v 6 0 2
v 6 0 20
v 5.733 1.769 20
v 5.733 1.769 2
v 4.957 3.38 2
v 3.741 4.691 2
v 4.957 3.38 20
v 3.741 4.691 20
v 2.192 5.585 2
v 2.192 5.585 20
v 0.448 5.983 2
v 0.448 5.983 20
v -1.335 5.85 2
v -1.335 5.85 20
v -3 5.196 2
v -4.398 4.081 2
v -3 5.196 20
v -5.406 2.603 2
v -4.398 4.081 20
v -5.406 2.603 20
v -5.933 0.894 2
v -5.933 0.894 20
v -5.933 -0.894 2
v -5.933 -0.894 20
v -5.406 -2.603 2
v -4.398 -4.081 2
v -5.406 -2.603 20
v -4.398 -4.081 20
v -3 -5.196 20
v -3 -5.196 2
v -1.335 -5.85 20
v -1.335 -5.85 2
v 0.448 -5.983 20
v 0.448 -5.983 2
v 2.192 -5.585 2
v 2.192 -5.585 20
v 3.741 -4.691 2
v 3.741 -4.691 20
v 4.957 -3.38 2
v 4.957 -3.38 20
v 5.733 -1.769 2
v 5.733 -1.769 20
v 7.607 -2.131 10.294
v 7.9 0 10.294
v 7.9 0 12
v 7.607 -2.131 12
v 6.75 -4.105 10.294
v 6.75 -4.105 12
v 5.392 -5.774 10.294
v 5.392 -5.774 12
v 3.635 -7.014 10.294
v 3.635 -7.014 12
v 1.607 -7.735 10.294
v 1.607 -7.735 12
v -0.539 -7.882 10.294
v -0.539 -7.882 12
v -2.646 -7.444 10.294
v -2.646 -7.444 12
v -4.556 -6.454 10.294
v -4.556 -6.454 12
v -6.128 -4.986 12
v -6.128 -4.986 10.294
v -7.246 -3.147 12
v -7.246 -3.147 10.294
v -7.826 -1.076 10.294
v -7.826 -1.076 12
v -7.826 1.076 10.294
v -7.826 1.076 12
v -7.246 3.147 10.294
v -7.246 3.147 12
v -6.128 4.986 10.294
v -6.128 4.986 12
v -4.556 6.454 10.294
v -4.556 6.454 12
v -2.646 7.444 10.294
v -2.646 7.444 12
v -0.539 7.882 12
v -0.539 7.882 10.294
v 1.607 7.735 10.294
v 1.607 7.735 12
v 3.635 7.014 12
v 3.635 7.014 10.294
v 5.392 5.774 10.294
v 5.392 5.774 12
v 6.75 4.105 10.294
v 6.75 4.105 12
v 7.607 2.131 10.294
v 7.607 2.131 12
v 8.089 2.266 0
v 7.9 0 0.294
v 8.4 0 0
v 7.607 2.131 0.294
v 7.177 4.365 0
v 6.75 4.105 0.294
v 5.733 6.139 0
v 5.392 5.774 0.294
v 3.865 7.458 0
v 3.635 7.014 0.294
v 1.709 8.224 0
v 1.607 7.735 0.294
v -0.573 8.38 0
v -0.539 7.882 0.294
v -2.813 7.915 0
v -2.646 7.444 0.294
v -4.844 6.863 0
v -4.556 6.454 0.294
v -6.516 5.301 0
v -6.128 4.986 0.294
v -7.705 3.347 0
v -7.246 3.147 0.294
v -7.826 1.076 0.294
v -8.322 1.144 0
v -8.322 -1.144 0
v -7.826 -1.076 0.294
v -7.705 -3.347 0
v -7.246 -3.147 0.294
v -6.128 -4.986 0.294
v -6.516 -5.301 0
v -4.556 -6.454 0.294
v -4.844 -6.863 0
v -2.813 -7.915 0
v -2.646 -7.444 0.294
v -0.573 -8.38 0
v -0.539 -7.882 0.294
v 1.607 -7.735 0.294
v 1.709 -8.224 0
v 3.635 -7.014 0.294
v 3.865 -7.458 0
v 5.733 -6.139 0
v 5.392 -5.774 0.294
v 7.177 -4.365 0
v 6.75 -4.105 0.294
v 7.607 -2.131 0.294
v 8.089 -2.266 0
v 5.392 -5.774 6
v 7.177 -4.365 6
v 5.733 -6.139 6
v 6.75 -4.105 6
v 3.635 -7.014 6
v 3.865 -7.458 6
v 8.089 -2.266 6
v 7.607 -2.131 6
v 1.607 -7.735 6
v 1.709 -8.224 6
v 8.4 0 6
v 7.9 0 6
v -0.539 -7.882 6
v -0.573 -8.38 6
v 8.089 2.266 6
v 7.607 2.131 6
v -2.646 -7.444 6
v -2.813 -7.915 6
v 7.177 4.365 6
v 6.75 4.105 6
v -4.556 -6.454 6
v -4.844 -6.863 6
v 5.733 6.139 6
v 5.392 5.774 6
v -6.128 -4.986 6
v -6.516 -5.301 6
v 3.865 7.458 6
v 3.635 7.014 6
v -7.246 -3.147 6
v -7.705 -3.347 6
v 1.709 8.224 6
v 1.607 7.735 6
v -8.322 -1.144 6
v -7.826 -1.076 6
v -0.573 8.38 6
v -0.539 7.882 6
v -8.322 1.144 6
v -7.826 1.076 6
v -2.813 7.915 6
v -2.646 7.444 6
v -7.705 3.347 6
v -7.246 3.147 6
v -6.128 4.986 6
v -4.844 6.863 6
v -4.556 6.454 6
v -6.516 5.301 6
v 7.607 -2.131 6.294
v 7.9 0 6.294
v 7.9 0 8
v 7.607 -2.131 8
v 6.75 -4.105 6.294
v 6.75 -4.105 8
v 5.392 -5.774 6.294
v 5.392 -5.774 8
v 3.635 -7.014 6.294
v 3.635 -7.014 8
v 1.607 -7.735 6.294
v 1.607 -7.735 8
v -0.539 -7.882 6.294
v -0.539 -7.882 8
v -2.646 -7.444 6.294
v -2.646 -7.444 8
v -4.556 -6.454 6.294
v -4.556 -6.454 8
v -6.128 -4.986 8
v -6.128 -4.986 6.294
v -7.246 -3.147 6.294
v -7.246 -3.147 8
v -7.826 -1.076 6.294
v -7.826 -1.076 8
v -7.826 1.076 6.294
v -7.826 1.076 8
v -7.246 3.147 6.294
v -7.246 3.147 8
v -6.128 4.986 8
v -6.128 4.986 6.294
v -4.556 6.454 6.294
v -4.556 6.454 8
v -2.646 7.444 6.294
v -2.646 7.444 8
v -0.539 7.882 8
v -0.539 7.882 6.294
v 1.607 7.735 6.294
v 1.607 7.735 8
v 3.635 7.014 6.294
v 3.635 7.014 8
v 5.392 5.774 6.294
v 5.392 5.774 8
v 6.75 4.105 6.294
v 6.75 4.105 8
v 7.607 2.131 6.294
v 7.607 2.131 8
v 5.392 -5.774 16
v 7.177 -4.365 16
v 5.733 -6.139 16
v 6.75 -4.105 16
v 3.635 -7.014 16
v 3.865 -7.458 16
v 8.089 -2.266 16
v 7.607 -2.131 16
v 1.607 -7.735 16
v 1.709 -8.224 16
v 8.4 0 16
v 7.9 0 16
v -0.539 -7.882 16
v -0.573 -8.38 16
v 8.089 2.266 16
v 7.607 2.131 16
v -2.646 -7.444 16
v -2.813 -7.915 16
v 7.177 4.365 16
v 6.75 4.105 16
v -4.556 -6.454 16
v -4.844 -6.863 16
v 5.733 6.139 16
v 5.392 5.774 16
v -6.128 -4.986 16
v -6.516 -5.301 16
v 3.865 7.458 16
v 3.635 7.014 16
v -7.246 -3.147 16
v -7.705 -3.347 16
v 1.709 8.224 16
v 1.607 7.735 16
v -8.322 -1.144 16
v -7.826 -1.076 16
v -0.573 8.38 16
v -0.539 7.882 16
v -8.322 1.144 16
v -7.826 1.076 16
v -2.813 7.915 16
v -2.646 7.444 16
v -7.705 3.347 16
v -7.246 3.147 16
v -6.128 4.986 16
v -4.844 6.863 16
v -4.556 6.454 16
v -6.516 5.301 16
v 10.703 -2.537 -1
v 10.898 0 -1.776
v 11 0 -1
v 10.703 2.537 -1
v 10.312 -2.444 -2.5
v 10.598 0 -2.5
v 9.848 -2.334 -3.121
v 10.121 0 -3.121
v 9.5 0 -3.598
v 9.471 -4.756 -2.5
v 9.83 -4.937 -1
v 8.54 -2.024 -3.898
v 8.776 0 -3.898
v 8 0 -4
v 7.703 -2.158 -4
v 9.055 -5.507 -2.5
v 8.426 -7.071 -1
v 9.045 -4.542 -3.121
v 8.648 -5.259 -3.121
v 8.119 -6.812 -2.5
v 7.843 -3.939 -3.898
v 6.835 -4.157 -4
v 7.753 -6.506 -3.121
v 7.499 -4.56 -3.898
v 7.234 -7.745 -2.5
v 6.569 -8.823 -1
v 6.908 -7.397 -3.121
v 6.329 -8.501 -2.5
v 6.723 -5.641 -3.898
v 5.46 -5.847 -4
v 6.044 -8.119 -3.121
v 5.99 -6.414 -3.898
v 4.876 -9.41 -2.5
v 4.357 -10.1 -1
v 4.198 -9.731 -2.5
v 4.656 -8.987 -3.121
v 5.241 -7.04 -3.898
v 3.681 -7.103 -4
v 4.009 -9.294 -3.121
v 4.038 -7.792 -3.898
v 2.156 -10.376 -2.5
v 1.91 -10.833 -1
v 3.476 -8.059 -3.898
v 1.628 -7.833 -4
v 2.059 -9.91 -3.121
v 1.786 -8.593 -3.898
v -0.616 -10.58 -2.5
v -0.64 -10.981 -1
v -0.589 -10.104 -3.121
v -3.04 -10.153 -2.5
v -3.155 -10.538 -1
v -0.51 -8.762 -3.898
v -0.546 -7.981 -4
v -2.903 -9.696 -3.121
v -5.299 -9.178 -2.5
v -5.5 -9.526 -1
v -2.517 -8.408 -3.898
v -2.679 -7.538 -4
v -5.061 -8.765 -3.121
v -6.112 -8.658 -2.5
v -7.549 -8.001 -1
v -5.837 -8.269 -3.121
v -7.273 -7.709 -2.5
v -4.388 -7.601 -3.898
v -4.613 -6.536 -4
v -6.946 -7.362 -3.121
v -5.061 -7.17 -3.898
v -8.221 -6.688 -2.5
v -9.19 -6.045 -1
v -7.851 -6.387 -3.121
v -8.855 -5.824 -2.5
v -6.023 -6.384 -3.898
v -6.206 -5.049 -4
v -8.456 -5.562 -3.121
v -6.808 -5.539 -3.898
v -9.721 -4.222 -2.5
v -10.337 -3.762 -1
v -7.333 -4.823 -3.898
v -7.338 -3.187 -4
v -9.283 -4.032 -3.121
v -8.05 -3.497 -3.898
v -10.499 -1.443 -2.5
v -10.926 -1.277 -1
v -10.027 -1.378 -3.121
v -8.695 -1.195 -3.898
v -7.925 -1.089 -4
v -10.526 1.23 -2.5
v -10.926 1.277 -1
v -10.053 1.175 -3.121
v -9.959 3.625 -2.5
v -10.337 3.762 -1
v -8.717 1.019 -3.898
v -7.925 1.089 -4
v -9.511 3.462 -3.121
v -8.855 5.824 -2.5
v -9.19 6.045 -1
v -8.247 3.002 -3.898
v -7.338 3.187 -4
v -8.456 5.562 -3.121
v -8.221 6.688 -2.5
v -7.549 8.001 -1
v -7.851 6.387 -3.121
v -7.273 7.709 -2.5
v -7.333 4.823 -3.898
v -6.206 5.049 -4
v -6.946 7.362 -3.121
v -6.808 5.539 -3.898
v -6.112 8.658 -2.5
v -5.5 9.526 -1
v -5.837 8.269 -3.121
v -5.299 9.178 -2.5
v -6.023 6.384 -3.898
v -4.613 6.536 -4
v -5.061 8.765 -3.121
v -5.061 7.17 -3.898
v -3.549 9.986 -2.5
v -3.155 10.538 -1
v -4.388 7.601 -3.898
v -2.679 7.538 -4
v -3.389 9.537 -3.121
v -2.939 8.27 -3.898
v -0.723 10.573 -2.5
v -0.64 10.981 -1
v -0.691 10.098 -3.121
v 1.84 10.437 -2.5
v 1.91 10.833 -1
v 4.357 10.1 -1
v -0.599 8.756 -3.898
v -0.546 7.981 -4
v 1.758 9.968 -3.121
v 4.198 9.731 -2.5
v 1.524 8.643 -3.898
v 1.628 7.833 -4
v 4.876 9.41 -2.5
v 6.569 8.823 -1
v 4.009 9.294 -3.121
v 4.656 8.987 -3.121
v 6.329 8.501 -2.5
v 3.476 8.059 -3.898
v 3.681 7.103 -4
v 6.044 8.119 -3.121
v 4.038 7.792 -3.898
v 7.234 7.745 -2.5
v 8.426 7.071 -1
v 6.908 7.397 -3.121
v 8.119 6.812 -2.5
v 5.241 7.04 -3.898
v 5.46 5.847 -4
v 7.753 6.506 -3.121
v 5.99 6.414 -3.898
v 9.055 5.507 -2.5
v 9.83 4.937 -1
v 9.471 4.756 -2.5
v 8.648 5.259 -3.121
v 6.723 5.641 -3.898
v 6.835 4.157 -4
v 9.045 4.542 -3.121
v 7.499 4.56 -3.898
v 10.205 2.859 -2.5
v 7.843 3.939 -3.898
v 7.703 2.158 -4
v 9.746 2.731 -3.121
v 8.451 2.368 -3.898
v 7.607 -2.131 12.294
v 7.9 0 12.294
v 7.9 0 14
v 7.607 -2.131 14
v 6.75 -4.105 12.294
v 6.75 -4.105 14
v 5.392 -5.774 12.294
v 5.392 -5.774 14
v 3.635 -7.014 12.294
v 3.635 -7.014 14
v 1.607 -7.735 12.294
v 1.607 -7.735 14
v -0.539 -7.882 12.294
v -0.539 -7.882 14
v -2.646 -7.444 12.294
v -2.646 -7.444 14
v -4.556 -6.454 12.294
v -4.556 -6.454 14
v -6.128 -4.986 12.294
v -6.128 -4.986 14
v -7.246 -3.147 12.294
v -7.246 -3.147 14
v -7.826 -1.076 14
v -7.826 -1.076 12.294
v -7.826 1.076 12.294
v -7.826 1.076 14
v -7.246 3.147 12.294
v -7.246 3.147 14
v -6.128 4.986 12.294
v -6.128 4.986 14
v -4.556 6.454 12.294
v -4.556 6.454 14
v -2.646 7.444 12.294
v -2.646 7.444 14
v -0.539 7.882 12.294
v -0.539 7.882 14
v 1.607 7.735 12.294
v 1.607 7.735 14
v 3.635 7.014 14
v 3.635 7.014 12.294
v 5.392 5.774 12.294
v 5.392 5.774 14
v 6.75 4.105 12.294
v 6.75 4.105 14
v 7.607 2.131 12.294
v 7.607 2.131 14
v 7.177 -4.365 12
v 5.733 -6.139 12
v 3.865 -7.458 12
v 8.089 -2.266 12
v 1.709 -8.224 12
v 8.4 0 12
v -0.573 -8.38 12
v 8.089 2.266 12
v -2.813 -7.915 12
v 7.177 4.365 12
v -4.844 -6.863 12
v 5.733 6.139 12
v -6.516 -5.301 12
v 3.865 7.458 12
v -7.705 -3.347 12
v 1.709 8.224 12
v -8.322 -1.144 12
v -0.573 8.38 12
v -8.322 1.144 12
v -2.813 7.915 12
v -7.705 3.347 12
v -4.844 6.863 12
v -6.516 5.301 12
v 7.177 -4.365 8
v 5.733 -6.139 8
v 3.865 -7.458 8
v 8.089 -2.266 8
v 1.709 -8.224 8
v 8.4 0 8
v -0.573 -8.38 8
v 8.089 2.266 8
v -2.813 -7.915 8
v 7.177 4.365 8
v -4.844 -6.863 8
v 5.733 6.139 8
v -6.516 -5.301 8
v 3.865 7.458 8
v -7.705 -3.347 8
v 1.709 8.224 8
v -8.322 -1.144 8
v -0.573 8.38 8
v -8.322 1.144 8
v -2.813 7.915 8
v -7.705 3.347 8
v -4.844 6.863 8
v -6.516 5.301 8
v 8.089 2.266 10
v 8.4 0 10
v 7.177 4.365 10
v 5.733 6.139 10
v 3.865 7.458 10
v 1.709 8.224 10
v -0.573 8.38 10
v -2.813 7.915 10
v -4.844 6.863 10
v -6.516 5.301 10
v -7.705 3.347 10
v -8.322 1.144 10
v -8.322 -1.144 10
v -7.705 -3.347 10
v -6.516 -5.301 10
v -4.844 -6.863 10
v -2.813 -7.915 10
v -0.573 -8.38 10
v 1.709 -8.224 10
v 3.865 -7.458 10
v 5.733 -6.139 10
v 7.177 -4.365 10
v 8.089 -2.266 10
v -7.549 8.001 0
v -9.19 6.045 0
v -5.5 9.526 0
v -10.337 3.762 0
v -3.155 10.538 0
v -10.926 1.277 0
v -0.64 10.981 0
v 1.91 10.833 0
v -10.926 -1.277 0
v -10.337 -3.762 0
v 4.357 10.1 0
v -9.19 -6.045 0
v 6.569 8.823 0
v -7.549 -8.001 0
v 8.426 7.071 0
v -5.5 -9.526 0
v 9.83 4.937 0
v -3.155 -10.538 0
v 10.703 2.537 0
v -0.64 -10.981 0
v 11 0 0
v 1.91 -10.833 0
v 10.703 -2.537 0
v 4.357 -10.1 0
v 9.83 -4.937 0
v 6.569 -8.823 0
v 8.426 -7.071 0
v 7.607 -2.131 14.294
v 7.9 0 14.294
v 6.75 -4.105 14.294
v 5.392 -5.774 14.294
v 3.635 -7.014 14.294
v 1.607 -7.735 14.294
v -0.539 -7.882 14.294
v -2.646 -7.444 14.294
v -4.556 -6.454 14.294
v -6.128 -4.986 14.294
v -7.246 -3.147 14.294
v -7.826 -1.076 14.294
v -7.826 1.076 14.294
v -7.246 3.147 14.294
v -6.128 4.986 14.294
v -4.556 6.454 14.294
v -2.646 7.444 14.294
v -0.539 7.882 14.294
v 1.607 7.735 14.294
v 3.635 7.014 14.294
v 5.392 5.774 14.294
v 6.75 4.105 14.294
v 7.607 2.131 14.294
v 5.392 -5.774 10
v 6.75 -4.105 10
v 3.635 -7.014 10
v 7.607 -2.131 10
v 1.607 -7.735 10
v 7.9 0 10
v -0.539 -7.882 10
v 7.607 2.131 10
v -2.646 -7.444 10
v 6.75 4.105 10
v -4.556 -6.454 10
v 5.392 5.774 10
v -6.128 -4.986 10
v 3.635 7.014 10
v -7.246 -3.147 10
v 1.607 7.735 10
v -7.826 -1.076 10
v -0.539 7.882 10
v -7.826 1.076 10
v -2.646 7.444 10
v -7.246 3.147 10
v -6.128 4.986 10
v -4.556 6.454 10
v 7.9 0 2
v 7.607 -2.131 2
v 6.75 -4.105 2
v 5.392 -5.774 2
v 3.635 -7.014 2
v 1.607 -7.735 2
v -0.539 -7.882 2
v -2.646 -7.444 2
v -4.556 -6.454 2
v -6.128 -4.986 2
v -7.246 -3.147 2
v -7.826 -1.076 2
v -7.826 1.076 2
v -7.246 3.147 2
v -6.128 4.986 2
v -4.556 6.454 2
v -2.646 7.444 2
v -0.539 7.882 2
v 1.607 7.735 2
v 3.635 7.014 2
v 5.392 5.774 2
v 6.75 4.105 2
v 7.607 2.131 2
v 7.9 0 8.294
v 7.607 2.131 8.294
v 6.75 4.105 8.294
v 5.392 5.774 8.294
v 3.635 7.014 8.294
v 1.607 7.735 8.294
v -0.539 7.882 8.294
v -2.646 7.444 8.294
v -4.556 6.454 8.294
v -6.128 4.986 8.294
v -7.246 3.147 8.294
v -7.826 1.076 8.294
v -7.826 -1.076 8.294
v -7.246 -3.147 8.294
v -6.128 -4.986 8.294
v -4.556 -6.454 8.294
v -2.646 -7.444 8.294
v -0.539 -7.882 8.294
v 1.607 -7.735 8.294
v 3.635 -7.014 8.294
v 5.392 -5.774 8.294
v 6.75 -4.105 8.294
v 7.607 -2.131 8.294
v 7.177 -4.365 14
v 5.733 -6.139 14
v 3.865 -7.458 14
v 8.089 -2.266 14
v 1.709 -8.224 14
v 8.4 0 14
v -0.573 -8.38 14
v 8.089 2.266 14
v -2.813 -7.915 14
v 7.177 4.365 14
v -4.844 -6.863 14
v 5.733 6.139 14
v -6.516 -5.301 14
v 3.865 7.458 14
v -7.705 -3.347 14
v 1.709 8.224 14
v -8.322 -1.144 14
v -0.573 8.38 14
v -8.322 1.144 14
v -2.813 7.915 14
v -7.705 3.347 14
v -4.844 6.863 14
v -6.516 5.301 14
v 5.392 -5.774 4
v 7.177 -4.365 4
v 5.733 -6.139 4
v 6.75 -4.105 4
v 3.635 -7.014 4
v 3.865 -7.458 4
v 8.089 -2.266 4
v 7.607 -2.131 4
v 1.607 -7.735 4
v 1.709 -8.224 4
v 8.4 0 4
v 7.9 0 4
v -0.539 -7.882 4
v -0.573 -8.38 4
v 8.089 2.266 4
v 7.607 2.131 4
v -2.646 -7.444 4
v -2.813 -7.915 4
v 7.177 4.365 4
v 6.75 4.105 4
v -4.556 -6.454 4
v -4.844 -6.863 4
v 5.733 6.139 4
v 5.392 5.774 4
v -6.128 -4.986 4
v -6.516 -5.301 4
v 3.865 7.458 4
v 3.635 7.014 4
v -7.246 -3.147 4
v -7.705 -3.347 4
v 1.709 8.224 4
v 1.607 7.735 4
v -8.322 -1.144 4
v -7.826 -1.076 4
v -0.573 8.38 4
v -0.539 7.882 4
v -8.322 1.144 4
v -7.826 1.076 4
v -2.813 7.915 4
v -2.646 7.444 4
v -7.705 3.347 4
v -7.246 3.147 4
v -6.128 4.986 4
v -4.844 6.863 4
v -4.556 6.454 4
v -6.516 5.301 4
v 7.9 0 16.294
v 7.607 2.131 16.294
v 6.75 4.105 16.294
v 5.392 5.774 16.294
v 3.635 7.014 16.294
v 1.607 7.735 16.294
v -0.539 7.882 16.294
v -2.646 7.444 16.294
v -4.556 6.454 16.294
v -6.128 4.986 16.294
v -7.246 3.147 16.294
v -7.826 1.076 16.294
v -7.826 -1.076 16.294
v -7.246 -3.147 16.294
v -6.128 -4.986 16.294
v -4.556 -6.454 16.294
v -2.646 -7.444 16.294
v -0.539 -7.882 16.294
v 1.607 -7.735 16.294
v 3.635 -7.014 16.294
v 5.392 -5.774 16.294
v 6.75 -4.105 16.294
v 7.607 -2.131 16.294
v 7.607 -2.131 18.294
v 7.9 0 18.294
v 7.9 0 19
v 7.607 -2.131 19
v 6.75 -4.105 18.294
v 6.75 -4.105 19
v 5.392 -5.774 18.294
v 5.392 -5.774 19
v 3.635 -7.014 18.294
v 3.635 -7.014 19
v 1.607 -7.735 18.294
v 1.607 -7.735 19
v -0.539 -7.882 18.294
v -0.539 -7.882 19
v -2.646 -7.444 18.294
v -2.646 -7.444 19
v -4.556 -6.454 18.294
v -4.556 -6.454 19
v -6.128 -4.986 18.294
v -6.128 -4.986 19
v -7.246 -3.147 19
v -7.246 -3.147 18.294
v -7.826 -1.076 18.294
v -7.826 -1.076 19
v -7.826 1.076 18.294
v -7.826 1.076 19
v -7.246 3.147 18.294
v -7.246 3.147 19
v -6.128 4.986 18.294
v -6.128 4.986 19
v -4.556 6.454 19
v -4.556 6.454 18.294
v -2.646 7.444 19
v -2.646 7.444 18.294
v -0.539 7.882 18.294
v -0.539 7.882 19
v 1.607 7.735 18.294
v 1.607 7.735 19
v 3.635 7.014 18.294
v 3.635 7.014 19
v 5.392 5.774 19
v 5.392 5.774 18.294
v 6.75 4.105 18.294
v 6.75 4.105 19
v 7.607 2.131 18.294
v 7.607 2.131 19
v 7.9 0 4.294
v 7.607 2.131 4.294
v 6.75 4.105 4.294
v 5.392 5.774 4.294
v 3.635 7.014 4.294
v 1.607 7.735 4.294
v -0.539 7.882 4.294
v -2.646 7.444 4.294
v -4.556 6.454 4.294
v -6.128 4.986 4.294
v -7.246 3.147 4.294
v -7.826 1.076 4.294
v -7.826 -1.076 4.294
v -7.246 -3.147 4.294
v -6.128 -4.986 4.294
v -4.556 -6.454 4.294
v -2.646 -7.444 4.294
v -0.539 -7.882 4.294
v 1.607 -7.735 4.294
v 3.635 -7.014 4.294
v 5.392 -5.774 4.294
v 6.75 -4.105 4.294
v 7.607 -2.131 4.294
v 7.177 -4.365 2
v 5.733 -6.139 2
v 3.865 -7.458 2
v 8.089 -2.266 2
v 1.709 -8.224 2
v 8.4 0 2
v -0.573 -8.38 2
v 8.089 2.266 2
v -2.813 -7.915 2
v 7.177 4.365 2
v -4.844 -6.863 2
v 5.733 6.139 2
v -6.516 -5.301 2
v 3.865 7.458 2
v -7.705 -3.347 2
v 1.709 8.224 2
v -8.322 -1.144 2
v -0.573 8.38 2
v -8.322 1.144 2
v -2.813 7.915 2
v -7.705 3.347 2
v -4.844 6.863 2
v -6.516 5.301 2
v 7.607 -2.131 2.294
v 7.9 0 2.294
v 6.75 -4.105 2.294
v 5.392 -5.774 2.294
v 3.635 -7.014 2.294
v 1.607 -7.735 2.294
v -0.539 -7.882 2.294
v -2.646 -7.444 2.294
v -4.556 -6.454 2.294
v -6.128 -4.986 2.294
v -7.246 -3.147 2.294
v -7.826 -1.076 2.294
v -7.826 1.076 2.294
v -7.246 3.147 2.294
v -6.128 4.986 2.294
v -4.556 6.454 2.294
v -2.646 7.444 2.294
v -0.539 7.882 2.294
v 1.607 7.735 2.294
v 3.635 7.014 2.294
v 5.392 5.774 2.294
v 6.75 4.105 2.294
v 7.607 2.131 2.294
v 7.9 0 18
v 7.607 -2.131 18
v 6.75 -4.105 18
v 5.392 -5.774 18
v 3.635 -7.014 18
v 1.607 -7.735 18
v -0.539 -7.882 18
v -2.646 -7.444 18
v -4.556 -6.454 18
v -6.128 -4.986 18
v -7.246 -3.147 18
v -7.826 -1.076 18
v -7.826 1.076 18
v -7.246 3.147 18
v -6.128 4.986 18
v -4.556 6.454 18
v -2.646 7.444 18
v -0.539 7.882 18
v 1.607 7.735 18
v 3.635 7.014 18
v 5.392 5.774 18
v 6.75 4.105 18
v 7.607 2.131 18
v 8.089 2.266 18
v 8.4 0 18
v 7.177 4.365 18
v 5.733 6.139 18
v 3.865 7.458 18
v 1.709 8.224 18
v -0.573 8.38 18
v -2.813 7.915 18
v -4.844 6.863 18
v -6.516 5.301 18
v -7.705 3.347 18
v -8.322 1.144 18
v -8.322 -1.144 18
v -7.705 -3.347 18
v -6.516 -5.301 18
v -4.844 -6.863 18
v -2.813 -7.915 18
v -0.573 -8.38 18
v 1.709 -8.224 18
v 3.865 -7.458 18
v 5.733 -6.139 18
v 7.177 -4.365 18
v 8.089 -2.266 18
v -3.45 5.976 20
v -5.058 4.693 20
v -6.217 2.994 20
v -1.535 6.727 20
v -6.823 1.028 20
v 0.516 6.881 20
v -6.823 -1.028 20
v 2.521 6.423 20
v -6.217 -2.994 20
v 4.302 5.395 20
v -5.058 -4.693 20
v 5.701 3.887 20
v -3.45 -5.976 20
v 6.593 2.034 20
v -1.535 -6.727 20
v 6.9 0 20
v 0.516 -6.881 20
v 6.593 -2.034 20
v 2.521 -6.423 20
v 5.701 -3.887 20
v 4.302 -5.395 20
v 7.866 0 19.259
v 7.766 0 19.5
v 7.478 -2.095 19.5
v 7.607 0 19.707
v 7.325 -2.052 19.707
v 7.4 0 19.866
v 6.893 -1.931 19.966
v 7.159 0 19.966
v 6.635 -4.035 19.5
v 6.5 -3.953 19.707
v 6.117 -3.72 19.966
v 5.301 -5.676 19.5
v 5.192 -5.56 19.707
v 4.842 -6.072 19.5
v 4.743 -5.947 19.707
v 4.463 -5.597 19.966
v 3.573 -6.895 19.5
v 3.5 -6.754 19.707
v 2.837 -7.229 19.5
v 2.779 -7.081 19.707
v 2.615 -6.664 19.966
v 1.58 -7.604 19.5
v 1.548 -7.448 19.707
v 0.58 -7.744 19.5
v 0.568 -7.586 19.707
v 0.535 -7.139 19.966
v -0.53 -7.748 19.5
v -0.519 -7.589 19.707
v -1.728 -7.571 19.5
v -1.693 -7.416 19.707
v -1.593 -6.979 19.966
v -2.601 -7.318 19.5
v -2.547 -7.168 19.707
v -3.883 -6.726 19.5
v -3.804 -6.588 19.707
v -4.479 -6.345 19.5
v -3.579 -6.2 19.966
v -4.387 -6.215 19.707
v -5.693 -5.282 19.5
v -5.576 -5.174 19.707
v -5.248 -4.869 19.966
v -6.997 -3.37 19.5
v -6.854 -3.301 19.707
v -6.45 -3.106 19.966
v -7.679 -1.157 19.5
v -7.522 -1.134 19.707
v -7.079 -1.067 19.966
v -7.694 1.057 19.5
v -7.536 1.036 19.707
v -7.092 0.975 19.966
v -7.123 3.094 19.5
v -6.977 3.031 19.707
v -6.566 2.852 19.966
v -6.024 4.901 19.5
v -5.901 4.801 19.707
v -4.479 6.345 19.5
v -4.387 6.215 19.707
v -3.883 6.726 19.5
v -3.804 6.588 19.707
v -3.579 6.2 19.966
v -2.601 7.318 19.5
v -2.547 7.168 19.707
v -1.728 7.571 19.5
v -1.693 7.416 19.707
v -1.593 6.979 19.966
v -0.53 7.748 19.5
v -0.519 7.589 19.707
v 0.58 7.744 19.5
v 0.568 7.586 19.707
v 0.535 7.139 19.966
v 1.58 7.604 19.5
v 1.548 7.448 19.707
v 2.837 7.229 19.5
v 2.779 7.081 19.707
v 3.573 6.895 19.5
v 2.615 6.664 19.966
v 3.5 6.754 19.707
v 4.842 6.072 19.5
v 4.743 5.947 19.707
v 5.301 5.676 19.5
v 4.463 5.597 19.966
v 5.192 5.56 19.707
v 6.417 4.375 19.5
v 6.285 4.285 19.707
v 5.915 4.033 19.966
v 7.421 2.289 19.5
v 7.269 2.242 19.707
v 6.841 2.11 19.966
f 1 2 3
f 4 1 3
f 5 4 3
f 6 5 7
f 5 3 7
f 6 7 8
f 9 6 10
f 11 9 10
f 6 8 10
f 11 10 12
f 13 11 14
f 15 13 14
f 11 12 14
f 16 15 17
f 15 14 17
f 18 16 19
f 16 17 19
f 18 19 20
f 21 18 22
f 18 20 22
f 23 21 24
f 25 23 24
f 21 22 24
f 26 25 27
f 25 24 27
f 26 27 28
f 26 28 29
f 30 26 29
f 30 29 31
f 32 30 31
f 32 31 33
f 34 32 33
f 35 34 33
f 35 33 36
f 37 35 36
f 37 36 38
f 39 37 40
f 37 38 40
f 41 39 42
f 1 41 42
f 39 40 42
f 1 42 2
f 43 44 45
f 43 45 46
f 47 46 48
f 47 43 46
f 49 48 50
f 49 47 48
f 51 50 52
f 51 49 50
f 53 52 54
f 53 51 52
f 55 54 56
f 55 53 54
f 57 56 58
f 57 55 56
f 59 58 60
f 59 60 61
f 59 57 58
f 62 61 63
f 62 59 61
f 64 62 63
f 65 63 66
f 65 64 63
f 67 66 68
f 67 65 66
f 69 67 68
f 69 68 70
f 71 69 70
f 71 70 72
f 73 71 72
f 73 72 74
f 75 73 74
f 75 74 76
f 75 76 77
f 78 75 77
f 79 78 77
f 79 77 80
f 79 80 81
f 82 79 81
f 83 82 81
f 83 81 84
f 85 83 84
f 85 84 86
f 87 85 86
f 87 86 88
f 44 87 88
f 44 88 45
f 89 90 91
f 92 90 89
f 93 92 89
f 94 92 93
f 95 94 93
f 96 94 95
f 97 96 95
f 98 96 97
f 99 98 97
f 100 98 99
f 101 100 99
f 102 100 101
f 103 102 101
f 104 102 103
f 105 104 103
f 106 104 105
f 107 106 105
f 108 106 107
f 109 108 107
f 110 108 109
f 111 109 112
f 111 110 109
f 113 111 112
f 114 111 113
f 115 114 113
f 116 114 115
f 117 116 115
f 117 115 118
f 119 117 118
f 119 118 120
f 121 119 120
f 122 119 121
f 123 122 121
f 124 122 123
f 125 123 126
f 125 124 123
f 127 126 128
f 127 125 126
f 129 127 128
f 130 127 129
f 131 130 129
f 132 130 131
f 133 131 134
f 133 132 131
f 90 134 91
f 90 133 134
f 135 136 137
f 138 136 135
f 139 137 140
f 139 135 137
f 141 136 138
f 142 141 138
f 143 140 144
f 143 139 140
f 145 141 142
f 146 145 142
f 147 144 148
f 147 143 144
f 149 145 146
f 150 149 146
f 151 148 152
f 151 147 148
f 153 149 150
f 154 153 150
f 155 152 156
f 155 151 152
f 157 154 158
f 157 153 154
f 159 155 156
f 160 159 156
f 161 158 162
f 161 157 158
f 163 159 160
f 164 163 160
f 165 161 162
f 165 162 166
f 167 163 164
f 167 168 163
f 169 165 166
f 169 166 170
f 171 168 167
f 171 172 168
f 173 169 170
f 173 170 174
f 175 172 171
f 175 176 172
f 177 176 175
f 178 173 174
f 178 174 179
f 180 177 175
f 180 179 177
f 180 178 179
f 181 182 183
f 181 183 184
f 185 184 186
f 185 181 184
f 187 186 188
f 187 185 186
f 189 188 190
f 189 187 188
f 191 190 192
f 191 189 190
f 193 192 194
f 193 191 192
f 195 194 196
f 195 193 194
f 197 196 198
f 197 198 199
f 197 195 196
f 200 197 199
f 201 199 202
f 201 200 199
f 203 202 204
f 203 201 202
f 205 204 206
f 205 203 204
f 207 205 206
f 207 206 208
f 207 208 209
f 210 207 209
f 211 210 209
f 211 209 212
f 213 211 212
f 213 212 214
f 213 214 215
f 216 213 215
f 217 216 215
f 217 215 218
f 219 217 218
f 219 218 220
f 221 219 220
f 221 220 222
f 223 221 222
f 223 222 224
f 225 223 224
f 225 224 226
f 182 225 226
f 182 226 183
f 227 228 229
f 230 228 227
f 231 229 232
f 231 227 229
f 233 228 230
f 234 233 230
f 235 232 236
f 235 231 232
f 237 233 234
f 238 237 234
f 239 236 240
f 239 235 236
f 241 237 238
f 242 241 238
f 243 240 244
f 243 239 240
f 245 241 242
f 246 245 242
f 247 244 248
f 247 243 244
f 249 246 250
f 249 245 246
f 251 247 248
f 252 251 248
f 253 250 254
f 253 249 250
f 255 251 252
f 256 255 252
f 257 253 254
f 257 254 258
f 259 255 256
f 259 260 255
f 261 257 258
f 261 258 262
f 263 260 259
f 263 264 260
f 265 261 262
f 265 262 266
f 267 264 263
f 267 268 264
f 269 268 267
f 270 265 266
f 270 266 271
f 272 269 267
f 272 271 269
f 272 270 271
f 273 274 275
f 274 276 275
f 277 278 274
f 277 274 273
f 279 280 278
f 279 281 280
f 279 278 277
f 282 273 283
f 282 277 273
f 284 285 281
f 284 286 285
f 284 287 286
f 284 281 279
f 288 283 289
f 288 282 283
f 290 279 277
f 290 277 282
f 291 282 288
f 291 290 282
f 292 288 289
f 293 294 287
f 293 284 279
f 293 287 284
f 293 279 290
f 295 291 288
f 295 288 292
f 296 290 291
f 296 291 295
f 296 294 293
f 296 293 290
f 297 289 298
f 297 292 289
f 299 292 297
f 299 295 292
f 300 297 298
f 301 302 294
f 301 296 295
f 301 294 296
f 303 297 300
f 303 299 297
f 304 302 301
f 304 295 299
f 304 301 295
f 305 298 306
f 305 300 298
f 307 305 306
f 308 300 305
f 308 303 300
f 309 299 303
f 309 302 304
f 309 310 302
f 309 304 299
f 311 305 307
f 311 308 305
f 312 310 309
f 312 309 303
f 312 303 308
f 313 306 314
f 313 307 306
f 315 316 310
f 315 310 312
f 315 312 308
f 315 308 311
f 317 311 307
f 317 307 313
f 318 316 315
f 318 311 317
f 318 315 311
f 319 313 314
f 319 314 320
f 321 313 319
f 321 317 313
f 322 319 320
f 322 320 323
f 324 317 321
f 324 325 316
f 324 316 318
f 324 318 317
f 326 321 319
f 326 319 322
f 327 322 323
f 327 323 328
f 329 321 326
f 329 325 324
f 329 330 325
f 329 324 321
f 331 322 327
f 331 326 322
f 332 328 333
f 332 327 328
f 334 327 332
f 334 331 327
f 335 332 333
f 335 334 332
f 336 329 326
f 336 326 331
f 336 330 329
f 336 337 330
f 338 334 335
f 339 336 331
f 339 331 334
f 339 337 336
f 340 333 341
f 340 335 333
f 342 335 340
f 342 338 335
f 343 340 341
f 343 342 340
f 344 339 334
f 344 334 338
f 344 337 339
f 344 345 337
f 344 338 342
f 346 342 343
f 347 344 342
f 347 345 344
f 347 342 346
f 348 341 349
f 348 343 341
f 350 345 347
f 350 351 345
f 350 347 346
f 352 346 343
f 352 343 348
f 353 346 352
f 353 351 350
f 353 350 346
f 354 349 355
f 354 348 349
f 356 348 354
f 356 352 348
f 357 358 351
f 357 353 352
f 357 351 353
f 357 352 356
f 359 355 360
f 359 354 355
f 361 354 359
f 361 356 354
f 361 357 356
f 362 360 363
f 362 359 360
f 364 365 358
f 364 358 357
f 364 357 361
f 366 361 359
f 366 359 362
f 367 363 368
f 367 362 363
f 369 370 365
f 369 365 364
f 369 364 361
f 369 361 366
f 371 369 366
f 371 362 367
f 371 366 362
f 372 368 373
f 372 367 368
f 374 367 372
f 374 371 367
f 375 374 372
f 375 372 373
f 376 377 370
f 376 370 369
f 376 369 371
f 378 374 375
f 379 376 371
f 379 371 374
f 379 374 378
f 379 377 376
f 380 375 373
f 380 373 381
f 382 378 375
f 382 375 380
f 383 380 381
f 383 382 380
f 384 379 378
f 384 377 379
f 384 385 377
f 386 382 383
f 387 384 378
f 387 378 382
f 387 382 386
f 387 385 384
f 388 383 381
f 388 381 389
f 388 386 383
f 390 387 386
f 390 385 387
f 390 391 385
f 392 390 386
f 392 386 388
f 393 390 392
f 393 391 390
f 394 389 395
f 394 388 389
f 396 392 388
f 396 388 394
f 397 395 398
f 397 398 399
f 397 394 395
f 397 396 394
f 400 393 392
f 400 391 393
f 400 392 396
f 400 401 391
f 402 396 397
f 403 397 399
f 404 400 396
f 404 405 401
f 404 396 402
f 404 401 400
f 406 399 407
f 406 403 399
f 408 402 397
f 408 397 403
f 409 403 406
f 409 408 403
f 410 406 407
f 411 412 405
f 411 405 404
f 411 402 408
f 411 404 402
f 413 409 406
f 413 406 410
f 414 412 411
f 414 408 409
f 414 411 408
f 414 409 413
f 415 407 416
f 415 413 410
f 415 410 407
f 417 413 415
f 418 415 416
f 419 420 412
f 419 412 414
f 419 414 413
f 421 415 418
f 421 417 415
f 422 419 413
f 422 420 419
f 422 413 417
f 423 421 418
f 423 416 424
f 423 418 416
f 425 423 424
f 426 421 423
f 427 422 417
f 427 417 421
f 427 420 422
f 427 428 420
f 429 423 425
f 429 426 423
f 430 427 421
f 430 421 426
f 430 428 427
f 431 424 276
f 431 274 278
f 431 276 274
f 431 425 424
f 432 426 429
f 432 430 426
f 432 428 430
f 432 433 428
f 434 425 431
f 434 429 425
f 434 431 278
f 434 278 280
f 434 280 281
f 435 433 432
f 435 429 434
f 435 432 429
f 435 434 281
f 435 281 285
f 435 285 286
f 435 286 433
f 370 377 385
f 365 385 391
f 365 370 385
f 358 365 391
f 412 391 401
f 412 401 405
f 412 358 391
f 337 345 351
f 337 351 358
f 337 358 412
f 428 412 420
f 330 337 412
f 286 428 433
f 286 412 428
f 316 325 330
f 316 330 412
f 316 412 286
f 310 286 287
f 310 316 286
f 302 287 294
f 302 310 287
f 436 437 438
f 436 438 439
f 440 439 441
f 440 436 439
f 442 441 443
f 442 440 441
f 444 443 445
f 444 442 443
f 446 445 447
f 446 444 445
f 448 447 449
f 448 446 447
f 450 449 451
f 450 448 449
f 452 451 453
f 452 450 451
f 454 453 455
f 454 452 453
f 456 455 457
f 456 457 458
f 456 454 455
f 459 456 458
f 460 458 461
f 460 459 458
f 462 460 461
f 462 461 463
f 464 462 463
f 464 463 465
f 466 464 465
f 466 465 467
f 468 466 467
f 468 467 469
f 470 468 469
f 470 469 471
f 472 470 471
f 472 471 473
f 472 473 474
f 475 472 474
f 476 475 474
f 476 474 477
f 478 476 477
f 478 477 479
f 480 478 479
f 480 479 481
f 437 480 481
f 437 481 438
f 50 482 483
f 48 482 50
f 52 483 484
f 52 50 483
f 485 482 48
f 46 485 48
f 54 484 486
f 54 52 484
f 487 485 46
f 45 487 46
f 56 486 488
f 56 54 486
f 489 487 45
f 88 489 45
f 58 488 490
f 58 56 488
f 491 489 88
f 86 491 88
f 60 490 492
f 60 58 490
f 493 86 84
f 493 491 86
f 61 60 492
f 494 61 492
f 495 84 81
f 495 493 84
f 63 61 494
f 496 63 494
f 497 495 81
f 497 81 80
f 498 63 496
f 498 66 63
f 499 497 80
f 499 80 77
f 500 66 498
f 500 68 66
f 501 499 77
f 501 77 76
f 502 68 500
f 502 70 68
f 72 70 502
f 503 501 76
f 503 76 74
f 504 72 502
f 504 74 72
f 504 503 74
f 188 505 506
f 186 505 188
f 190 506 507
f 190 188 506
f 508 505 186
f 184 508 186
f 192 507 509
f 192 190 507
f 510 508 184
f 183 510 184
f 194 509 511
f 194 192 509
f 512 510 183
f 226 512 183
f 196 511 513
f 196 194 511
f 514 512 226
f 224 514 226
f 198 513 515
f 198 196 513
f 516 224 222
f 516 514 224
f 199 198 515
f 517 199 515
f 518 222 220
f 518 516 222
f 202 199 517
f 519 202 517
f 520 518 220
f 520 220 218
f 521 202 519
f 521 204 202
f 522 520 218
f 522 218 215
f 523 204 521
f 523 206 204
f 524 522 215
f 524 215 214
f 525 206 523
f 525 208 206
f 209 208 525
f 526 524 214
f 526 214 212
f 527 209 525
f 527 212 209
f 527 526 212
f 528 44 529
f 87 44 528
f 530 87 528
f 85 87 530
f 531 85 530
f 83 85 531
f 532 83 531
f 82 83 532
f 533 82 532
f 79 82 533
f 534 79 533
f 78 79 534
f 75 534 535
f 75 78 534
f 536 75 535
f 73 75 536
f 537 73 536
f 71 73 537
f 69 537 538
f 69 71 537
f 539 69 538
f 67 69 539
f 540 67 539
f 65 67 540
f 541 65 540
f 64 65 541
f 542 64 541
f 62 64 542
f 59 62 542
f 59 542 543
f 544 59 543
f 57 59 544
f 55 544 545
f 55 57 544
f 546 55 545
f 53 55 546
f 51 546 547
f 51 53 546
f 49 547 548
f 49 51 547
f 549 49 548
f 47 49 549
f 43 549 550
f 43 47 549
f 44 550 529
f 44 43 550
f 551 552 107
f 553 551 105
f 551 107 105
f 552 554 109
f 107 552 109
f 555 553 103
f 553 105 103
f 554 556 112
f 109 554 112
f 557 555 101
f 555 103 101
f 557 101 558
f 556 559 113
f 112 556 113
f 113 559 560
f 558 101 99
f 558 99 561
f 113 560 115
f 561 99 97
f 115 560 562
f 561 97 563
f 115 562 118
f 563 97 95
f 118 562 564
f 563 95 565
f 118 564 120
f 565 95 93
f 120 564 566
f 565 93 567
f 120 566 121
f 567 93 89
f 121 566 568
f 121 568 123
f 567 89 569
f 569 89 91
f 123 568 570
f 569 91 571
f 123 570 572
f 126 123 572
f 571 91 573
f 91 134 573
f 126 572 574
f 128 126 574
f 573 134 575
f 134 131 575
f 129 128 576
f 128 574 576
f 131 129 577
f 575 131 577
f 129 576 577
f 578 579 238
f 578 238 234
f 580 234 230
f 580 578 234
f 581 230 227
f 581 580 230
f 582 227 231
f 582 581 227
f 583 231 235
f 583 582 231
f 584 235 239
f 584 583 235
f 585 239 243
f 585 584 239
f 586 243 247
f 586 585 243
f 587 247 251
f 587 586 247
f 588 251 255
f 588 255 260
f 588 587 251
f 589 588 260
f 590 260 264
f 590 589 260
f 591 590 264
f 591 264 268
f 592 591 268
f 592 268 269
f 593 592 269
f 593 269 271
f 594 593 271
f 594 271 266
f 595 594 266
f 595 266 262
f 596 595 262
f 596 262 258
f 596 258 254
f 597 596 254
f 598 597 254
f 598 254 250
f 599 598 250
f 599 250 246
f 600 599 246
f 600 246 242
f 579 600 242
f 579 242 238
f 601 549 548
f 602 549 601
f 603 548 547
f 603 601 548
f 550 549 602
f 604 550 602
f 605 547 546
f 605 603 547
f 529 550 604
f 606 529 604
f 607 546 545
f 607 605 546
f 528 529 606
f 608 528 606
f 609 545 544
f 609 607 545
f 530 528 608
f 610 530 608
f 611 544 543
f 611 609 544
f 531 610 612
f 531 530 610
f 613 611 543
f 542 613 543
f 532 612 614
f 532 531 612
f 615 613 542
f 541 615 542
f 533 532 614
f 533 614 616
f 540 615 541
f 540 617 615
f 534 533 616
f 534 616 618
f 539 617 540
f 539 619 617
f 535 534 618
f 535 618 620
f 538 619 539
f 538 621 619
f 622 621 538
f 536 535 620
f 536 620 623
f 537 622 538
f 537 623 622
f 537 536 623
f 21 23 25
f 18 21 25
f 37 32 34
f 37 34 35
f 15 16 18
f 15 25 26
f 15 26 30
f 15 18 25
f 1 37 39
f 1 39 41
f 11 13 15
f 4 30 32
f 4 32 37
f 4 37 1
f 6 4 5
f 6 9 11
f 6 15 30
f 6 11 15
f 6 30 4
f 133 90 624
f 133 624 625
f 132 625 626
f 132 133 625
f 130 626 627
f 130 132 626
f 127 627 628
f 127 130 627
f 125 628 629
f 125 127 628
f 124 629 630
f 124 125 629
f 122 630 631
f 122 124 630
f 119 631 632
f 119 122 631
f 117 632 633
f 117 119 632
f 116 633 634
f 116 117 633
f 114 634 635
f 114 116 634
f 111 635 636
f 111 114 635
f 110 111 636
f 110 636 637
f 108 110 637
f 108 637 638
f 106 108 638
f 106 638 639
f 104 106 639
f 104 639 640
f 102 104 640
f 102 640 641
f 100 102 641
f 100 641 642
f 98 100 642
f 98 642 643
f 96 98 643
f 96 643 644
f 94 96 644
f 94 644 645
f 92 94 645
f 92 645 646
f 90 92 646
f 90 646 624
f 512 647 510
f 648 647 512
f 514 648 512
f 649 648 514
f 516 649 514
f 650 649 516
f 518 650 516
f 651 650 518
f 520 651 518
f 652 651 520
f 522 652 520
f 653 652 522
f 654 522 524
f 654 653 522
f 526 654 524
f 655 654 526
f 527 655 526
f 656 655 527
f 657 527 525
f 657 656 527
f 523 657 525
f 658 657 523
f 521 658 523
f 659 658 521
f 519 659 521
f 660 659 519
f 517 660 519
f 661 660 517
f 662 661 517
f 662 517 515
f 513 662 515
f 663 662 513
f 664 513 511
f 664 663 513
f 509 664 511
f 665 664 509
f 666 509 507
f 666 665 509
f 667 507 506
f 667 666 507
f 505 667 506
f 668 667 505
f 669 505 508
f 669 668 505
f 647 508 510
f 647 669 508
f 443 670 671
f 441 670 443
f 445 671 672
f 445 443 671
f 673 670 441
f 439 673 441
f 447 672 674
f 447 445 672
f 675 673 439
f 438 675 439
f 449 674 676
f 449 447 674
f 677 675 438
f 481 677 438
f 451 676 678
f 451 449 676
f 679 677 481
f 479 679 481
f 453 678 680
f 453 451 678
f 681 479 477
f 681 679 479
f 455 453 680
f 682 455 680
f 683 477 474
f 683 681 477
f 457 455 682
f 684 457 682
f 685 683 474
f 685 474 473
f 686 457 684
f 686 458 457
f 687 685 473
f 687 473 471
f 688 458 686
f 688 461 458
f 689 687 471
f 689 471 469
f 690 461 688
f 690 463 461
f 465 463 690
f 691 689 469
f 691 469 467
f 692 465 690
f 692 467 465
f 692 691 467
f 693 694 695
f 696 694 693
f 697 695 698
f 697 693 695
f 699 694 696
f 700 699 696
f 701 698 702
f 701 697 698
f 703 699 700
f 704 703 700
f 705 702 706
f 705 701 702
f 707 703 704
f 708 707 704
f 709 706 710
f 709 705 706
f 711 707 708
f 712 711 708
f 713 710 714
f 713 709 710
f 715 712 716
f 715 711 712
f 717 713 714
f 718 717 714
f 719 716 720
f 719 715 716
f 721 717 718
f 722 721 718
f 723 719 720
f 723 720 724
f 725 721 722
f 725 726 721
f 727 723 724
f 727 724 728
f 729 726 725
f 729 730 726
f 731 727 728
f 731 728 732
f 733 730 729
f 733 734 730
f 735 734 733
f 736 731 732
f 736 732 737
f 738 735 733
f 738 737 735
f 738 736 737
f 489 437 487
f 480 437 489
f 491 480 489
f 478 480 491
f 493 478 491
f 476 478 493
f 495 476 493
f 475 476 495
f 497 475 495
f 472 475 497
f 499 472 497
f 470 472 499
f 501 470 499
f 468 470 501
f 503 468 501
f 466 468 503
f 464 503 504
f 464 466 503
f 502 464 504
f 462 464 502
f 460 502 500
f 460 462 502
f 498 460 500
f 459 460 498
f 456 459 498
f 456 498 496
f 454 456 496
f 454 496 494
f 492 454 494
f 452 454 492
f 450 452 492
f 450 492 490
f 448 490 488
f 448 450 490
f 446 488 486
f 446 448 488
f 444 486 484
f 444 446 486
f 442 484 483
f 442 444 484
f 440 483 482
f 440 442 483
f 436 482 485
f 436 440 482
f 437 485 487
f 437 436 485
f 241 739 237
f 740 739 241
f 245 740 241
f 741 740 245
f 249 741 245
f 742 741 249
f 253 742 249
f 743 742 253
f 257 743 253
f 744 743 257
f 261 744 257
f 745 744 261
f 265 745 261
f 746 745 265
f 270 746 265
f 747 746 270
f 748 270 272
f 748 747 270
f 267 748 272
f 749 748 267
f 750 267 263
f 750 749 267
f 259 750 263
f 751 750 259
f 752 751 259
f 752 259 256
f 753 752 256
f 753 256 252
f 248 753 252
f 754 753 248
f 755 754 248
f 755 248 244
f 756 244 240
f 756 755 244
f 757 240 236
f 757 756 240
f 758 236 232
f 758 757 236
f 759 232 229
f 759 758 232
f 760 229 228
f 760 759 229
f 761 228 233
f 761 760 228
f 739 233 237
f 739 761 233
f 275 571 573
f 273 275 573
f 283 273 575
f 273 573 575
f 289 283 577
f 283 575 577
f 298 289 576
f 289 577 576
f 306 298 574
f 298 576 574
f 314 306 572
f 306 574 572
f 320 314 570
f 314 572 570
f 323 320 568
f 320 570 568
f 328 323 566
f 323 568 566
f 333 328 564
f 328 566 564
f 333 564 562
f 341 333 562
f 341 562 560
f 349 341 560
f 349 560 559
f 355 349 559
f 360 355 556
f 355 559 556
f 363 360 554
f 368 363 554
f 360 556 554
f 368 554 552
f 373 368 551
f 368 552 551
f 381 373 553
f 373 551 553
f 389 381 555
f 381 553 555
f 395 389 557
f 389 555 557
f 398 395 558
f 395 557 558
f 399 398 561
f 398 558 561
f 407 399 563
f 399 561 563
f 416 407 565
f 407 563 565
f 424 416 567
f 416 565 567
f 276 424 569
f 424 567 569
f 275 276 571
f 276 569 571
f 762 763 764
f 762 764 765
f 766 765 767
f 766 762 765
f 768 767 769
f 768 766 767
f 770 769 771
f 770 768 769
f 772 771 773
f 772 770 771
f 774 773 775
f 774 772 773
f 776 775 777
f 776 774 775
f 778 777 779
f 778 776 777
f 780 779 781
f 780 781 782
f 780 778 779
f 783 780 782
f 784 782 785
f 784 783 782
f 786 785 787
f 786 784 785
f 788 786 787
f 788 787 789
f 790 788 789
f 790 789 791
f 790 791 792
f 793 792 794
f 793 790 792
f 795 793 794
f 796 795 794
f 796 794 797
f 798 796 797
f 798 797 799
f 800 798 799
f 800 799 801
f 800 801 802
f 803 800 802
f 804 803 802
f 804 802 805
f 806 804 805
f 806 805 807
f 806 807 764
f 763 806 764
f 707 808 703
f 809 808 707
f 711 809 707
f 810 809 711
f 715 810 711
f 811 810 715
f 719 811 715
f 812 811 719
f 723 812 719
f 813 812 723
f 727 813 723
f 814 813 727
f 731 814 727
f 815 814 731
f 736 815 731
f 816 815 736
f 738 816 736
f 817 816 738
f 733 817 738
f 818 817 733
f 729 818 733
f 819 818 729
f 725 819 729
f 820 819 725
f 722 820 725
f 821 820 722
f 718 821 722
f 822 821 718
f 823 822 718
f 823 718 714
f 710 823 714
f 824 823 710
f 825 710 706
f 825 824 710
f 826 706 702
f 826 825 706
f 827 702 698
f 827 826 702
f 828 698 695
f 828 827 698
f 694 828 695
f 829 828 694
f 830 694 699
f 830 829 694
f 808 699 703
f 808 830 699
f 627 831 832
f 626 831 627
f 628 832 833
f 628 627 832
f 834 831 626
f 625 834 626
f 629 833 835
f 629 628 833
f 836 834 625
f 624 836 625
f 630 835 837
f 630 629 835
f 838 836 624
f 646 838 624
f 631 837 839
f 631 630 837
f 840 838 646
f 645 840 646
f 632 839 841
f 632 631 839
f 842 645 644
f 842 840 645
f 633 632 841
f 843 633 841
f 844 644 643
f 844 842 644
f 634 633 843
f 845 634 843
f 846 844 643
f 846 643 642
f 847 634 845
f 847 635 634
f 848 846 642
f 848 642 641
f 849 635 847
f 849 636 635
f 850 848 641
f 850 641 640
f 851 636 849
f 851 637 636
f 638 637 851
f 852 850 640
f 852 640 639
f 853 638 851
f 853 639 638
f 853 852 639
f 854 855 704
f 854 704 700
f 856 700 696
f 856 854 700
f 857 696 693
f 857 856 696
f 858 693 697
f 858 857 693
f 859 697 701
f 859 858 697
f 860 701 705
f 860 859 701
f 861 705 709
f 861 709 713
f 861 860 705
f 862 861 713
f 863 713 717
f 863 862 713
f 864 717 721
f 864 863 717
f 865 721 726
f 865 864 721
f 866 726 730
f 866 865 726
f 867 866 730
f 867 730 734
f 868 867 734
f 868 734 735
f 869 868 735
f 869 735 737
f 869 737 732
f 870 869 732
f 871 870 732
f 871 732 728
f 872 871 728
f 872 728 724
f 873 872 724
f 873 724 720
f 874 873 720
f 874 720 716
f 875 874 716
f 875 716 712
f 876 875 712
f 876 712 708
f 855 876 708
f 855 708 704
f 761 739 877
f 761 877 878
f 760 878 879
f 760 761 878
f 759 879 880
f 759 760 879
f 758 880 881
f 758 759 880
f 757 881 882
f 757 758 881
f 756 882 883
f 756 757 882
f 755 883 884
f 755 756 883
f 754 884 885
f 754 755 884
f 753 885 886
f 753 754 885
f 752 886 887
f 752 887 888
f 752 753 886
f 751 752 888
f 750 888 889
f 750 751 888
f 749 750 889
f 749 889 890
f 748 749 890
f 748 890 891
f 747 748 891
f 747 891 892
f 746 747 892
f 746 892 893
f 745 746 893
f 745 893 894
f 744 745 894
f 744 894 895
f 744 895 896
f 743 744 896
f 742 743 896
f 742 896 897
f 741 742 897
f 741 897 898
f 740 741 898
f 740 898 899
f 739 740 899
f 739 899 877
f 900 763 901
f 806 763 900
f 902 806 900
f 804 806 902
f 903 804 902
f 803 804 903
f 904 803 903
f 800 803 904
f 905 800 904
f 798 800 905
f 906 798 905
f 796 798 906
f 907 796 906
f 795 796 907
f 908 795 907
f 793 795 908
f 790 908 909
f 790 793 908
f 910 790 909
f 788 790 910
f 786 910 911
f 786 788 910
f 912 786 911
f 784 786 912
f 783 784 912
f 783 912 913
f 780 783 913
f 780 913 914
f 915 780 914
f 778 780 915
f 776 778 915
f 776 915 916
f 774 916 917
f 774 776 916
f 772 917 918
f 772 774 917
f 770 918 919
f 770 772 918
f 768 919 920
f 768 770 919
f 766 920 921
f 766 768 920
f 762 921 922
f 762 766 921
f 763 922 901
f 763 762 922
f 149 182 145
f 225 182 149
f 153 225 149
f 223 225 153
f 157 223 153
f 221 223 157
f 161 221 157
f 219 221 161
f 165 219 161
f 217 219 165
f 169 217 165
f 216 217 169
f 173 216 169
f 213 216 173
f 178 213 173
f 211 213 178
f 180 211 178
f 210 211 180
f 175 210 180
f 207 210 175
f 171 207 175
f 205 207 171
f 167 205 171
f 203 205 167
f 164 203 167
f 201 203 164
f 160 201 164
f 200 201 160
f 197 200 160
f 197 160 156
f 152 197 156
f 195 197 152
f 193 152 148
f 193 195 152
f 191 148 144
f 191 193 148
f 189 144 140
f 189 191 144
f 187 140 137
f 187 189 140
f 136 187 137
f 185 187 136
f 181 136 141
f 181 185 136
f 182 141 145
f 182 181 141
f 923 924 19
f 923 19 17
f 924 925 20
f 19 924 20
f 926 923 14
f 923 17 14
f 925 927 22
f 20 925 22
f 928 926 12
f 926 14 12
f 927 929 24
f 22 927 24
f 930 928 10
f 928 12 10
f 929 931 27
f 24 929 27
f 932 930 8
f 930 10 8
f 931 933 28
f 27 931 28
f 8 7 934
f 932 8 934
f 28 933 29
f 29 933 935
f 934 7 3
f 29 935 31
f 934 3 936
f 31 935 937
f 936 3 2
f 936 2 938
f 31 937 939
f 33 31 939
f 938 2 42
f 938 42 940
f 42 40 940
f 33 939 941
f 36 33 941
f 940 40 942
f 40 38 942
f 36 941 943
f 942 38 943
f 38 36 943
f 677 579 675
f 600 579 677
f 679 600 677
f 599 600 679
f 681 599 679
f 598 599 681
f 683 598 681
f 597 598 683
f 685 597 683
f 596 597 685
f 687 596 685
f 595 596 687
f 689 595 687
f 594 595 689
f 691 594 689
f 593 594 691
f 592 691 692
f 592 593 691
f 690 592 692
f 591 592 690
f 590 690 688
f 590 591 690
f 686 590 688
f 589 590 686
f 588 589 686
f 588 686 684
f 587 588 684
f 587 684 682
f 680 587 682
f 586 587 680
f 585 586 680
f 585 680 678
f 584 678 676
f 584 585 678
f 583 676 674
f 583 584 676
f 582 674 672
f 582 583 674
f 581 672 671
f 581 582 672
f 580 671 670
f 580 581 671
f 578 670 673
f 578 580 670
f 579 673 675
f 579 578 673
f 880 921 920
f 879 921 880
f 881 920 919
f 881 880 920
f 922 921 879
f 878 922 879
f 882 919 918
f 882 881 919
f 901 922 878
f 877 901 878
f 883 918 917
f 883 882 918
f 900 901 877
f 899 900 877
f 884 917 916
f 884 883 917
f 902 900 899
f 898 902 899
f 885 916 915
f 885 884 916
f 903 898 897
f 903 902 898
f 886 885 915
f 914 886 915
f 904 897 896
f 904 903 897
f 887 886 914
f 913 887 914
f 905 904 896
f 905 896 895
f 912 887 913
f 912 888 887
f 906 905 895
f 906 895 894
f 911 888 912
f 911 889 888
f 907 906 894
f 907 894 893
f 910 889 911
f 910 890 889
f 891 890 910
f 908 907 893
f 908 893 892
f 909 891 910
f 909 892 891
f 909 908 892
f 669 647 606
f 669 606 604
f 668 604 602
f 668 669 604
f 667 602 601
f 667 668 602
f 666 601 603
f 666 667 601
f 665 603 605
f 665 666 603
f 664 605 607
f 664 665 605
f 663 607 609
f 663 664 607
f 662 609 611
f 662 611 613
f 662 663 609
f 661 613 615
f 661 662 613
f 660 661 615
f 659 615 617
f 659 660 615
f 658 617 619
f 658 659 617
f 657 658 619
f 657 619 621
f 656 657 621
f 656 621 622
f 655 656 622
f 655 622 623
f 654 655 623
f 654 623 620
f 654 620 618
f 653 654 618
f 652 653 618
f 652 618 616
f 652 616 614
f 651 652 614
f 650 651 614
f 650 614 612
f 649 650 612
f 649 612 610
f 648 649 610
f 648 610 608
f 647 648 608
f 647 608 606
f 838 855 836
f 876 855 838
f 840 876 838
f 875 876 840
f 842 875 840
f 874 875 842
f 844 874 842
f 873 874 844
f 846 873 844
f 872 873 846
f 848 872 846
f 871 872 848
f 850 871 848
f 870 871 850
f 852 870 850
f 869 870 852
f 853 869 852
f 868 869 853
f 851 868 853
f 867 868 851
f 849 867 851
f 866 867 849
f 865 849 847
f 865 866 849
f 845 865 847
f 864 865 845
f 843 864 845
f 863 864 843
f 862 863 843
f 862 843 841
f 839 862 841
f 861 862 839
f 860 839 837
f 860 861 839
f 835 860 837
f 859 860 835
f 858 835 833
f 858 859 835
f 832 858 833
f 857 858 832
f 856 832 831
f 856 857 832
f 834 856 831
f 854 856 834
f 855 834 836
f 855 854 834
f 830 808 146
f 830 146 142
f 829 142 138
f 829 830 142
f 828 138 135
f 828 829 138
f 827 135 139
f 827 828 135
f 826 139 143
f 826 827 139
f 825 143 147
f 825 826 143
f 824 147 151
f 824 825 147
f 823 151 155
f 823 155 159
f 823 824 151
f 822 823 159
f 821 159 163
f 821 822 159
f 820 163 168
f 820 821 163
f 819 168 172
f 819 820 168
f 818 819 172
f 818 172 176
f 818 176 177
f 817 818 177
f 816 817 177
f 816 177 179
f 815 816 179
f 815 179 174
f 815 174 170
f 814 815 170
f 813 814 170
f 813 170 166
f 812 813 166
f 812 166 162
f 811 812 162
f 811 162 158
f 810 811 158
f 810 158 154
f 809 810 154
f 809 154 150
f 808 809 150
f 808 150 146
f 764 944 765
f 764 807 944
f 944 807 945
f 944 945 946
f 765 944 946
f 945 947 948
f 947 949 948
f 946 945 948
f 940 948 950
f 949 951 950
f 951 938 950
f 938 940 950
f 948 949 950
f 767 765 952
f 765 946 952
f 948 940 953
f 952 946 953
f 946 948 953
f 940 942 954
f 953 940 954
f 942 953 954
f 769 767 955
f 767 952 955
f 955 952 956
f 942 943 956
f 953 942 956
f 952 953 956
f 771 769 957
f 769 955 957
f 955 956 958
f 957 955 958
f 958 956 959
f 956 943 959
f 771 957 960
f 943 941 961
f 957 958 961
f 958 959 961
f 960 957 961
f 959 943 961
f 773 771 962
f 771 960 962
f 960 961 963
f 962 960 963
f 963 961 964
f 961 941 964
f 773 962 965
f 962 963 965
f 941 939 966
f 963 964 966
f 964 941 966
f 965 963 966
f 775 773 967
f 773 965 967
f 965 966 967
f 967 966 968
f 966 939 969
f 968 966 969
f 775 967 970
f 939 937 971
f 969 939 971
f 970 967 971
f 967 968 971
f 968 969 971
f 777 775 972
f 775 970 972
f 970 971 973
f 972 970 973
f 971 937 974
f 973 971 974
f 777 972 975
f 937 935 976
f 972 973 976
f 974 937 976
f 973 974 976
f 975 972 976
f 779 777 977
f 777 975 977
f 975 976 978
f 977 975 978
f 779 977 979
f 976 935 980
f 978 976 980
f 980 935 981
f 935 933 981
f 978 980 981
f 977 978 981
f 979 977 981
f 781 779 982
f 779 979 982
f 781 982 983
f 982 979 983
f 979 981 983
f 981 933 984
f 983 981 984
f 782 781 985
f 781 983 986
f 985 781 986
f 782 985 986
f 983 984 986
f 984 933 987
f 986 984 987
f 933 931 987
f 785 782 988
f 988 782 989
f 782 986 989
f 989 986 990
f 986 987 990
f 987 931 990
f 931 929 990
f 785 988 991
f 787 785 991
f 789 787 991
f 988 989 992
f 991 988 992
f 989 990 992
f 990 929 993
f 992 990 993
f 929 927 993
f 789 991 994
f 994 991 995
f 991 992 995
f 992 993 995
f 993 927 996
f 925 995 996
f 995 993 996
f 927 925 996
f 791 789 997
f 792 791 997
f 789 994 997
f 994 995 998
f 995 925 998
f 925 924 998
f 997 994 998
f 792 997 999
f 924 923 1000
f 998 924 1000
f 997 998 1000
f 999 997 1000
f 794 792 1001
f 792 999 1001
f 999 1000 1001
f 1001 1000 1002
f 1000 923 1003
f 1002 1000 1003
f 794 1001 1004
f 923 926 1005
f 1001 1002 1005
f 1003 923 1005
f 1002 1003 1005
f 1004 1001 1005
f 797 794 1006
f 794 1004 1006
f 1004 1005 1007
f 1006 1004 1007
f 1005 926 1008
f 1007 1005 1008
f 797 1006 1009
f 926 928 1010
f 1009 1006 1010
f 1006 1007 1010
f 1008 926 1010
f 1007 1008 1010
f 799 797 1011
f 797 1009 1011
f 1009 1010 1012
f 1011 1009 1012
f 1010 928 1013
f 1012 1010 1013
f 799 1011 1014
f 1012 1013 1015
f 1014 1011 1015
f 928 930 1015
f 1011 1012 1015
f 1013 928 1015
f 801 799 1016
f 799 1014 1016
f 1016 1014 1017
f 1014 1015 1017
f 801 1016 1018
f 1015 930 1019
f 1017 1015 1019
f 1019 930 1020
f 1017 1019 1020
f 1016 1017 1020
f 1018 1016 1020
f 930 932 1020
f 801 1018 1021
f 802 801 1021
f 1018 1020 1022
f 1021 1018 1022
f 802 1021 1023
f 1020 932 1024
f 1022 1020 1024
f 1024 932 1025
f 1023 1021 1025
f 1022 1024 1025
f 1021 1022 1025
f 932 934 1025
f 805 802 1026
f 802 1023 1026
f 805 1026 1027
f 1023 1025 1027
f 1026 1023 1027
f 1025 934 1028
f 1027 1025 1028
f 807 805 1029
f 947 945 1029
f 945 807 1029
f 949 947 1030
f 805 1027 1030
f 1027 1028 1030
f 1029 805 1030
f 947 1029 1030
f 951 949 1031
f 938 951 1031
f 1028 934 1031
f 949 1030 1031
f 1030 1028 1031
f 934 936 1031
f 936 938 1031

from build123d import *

# Parameters (mm, degrees)
LINEARPATTERN_COUNT = 10
LINEARPATTERN_PITCH = 2
SKETCH_R            = 7.9
PAD_DEPTH           = 20
SKETCH001_R         = 11
PAD001_DEPTH        = 4
FILLET_R            = 3
SKETCH002_R         = 6
POCKET_DEPTH        = 18
FILLET001_R         = 1


with BuildPart() as part:
    # Cone → Cone (revolve)
    with BuildSketch(Plane.XZ):
        Polygon((0, 0), (8.4, 0), (5, 2), (0, 2), align=None)
    cone = revolve(axis=Axis((0, 0, 0), (0, 0, 1)))

    # LinearPattern: Cone ×10
    with Locations(*[(0, 0, i * LINEARPATTERN_PITCH) for i in range(1, LINEARPATTERN_COUNT)]):
        add(cone)

    # Sketch (on Face21 of LinearPattern) → Pad (new body)
    with BuildSketch(Plane(origin=(0, 0, 0), x_dir=(1, 0, 0), z_dir=(0, 0, -1))):
        Circle(SKETCH_R)
    extrude(amount=-PAD_DEPTH)

    # Sketch001 (on Face33 of Pad) → Pad001 (join)
    with BuildSketch(Plane(origin=(0, 0, 0), x_dir=(1, 0, 0), z_dir=(0, 0, -1))):
        Circle(SKETCH001_R)
    extrude(amount=PAD001_DEPTH)

    # Fillet
    fillet_edges = [part.edges().sort_by_distance(p)[0] for p in [
        (-11, 0, -4),
    ]]
    fillet(fillet_edges, radius=FILLET_R)

    # Sketch002 (on Face34 of Fillet) → Pocket (cut)
    with BuildSketch(Plane.XY.offset(20)):
        Circle(SKETCH002_R)
    extrude(amount=-POCKET_DEPTH, mode=Mode.SUBTRACT)

    # Fillet001
    fillet001_edges = [part.edges().sort_by_distance(p)[0] for p in [
        (-7.9, 0, 20),
    ]]
    fillet(fillet001_edges, radius=FILLET001_R)


solid = part.part
